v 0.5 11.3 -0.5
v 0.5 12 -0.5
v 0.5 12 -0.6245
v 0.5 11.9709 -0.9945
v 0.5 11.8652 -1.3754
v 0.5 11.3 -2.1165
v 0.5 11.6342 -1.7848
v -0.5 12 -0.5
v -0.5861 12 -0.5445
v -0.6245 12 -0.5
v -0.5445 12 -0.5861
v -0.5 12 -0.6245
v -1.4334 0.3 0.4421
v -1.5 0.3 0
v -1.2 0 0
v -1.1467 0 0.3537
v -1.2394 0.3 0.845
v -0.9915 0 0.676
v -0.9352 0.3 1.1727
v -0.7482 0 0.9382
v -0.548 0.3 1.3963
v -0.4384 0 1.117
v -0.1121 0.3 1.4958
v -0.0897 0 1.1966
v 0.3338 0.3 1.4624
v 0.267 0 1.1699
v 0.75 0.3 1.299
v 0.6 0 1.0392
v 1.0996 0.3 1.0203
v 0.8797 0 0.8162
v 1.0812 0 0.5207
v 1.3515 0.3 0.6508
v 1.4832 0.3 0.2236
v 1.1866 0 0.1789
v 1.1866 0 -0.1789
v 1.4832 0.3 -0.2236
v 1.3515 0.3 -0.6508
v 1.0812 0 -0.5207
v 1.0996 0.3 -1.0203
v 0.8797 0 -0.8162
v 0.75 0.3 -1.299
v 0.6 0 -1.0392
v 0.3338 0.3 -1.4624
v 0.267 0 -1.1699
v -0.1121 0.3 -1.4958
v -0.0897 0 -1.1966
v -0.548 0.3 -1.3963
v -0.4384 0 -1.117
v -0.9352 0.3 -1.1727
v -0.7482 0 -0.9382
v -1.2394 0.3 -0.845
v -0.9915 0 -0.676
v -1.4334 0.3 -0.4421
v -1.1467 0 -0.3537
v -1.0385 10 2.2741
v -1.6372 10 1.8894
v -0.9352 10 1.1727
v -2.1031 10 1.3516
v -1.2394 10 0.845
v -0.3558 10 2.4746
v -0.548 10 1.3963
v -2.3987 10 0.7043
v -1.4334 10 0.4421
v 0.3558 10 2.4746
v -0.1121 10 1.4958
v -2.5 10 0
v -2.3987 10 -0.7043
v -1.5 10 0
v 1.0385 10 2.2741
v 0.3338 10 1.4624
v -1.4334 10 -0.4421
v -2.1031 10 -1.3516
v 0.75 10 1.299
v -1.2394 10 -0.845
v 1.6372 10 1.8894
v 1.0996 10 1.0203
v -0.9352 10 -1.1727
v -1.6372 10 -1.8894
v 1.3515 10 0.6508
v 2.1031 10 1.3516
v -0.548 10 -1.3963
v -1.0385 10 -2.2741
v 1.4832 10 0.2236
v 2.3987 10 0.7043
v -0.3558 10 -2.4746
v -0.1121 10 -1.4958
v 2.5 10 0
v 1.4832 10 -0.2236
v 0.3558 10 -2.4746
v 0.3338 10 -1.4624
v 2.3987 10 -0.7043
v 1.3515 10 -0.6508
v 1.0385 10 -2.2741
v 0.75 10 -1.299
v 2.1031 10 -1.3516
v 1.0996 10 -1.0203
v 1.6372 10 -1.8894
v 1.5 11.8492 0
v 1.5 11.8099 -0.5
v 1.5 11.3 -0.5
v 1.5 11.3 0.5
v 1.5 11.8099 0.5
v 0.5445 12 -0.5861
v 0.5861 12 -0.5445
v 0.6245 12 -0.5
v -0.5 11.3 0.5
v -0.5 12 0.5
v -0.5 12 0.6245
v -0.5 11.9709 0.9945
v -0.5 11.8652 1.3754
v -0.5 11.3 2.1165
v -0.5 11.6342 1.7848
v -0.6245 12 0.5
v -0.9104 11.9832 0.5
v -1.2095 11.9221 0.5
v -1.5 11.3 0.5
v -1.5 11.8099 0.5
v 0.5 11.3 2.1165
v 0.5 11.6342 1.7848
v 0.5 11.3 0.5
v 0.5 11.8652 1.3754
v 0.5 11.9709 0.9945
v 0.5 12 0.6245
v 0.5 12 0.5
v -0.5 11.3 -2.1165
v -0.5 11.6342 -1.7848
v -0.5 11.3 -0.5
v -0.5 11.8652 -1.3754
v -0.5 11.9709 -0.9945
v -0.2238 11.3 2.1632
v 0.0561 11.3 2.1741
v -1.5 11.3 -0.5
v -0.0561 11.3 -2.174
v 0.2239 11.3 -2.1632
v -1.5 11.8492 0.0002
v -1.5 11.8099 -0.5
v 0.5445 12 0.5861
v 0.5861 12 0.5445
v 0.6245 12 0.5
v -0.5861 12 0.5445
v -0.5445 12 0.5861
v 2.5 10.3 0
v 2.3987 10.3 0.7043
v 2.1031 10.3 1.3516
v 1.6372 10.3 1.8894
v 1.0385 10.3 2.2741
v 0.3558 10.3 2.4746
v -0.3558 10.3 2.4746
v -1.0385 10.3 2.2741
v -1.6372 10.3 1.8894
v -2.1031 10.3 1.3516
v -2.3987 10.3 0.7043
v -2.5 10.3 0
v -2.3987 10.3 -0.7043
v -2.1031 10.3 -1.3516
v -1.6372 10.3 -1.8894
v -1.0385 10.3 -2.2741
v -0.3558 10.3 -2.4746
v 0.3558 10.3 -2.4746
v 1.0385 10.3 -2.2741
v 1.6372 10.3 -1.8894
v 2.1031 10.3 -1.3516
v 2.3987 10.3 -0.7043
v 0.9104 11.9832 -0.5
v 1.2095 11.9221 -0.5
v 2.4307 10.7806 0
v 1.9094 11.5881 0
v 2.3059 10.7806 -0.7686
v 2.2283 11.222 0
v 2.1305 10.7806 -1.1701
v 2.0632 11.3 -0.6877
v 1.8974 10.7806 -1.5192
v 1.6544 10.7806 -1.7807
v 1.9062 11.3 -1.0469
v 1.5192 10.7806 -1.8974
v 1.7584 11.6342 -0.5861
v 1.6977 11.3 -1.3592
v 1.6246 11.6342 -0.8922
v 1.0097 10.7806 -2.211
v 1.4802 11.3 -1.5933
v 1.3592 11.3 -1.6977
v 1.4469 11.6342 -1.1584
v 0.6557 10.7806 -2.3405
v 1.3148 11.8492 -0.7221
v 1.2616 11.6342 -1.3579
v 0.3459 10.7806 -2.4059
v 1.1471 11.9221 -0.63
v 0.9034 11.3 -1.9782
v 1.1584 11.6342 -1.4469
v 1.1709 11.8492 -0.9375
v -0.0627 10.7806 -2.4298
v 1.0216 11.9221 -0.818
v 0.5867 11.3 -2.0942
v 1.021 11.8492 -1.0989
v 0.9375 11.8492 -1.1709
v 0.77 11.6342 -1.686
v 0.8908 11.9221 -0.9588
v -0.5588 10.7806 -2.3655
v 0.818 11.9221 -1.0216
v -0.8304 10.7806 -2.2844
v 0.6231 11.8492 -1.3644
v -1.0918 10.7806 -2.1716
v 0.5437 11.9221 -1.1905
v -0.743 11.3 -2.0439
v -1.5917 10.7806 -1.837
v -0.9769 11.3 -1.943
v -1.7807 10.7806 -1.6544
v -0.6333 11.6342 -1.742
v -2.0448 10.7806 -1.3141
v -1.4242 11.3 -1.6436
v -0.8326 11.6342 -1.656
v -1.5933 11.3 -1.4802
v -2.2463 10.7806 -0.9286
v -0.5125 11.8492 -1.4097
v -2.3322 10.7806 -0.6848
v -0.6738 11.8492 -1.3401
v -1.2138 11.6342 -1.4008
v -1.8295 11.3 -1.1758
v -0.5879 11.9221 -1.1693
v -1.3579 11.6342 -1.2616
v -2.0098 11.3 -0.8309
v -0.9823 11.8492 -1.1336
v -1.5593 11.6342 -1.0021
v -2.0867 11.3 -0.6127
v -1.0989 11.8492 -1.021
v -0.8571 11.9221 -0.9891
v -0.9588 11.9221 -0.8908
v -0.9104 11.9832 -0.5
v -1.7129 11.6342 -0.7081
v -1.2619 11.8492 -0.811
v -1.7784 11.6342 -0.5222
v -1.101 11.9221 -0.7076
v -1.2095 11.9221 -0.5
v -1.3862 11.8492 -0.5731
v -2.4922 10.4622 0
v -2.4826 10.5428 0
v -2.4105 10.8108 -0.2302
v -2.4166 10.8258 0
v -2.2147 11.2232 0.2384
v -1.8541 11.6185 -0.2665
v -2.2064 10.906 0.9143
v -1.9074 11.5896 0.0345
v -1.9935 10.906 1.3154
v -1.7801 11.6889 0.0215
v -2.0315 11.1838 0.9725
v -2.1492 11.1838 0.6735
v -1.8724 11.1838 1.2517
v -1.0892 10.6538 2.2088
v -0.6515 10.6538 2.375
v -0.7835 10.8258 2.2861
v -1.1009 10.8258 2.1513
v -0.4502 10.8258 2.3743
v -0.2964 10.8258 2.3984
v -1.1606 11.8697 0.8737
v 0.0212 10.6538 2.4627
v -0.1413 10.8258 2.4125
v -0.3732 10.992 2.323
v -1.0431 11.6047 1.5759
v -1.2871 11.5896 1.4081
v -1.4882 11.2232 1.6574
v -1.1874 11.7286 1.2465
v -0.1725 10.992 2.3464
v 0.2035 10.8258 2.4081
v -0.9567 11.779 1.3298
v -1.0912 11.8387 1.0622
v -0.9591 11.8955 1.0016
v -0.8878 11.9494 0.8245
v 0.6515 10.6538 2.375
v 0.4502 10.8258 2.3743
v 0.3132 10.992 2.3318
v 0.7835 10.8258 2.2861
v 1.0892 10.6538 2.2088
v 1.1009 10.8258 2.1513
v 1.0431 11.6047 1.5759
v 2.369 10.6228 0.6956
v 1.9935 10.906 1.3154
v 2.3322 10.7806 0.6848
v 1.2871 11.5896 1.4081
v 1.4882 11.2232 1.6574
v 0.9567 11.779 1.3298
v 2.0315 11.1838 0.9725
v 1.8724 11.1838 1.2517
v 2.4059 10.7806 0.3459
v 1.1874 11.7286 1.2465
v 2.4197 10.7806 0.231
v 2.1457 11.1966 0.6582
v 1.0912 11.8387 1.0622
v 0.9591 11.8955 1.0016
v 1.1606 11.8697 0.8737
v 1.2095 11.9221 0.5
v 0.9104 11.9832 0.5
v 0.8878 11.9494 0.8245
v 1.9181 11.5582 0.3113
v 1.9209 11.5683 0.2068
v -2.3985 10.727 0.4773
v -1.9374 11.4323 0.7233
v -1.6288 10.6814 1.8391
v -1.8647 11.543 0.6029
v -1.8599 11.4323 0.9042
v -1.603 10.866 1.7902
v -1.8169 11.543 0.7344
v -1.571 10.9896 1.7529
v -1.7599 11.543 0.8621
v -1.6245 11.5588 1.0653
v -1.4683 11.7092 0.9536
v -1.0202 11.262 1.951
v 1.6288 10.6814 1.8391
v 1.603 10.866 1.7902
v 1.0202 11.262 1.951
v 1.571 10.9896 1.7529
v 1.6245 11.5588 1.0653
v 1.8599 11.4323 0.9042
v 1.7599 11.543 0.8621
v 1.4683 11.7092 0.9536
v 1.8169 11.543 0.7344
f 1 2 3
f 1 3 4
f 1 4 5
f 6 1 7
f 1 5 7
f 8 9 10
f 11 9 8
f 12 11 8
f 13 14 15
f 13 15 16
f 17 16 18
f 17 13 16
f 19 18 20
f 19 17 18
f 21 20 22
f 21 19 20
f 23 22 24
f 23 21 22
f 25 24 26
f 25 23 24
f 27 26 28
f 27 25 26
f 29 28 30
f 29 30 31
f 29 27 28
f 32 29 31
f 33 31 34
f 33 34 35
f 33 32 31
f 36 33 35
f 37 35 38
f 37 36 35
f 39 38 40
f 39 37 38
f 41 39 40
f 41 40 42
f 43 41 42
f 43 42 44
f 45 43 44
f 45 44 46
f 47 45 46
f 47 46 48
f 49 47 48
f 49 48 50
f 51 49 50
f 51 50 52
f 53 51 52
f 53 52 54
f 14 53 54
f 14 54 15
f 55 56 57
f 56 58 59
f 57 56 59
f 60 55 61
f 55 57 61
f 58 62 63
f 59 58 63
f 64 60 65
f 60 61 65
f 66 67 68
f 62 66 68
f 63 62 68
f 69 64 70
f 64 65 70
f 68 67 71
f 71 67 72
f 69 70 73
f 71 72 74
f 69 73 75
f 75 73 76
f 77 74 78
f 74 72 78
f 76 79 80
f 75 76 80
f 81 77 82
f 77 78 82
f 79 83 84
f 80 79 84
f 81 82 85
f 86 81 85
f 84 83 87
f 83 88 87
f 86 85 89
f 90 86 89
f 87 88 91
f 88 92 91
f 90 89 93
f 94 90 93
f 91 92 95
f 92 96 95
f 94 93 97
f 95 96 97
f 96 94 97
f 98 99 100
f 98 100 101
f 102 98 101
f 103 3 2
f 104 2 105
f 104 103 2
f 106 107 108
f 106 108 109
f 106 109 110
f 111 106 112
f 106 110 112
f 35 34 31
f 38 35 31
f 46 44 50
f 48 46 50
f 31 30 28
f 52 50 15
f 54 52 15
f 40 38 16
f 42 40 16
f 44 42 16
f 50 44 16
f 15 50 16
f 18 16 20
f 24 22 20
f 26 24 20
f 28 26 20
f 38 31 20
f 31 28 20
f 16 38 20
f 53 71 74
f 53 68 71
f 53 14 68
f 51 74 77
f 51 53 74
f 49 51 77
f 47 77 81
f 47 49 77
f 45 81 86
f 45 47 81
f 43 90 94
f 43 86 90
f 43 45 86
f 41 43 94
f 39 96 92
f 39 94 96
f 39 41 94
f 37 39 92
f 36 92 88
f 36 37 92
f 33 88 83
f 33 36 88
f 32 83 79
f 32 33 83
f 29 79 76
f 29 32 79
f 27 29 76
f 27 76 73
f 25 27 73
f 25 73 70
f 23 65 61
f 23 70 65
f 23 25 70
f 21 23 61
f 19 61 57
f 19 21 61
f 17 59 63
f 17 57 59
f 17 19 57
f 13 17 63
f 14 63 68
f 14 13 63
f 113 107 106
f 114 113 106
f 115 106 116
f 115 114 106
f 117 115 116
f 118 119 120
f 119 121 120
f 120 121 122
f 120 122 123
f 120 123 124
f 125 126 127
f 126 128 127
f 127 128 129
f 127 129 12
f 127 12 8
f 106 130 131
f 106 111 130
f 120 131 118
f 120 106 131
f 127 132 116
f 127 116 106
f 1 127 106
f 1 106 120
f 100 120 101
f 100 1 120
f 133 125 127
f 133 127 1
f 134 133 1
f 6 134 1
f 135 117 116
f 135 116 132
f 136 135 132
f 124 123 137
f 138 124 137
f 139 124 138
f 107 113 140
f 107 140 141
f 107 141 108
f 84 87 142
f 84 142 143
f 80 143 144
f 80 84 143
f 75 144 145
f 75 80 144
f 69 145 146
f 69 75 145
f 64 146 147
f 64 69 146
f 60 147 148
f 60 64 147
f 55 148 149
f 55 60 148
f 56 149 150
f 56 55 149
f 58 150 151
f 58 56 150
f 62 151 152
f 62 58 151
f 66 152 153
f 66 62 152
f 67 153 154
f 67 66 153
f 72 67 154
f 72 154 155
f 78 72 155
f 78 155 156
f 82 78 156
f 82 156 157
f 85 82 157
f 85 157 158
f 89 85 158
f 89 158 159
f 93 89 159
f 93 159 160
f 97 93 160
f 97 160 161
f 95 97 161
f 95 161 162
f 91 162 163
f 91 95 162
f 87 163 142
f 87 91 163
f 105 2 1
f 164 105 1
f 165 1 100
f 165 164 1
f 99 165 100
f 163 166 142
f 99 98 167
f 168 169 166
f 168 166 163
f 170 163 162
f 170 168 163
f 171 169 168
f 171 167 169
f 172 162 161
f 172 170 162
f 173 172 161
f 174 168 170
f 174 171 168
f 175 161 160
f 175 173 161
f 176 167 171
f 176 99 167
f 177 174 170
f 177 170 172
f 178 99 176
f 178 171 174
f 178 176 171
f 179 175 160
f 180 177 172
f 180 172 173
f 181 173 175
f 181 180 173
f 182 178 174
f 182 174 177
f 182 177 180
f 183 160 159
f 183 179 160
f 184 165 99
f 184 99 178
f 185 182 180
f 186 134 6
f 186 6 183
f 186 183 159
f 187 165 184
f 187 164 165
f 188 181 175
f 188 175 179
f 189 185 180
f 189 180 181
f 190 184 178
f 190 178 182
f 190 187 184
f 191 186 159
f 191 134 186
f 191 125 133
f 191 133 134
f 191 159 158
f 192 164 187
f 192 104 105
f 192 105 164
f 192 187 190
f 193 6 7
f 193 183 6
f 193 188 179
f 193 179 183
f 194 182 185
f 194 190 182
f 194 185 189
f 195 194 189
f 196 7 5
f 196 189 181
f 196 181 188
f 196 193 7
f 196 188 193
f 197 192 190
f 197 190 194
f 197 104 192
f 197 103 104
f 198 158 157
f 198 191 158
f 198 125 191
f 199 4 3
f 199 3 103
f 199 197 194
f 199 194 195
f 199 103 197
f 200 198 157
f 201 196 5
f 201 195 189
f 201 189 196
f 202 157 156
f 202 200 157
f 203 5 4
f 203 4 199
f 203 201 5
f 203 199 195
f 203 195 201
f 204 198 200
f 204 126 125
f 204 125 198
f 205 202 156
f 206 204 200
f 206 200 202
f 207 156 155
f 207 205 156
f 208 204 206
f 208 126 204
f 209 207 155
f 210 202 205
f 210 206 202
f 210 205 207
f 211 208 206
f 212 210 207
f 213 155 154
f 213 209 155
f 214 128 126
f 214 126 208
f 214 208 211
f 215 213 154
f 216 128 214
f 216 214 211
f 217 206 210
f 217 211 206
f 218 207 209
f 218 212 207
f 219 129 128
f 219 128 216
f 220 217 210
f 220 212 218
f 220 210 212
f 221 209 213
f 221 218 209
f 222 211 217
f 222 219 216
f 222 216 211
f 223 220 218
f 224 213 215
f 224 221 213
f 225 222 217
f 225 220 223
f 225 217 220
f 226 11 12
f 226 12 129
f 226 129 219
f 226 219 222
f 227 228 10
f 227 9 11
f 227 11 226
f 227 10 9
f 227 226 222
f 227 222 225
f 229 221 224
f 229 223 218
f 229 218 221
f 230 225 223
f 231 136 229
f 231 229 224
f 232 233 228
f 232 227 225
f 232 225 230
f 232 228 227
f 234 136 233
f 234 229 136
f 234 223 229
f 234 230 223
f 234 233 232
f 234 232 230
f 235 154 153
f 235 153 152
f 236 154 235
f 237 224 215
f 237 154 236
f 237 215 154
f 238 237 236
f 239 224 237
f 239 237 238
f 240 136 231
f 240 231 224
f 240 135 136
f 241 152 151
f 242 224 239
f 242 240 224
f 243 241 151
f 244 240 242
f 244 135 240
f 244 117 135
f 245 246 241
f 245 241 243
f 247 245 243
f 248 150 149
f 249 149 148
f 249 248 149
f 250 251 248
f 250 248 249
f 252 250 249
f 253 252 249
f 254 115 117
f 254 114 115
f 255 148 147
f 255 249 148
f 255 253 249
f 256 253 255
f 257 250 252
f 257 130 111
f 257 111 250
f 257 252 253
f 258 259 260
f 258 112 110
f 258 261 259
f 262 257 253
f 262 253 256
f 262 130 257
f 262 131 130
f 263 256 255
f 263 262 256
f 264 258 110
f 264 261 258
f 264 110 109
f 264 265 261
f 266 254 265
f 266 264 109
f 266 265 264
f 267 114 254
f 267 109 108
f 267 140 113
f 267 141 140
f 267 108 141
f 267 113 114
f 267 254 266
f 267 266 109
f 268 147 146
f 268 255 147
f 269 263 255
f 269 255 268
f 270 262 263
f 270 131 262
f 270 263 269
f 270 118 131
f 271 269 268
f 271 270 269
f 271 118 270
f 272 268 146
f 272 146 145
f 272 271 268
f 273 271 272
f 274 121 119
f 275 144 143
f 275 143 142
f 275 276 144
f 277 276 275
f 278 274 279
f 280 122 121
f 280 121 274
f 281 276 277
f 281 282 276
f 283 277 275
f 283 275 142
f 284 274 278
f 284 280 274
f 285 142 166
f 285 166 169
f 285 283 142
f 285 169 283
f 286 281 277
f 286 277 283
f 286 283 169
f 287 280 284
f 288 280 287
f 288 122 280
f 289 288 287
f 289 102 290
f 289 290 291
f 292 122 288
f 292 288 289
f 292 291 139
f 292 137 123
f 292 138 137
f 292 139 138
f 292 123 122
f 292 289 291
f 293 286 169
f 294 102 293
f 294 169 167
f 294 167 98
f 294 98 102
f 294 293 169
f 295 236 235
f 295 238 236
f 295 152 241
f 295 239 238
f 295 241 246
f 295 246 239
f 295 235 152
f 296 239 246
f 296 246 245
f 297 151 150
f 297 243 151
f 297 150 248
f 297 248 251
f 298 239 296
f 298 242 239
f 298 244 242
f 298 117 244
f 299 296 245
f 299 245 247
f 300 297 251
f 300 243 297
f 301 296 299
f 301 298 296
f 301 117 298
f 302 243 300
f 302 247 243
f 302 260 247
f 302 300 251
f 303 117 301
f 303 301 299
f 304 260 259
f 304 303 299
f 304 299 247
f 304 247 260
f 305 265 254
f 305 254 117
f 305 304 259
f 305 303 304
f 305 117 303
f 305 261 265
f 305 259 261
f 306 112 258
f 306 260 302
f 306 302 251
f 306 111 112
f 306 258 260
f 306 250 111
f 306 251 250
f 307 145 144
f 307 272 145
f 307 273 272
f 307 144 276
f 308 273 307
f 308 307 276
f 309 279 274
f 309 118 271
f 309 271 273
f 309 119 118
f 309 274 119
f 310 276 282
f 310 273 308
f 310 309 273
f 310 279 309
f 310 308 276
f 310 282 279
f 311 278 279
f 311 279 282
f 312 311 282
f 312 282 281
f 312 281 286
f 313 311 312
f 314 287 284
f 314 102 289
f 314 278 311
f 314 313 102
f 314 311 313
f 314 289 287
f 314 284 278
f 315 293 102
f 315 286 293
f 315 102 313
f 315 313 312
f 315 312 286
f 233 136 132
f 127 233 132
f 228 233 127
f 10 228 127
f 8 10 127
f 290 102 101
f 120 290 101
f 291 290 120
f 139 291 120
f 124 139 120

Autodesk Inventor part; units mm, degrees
ref_plane "YZ Plane" through (0, 0, 0) normal (1, 0, 0) x (0, 1, 0)
ref_plane "XZ Plane" through (0, 0, 0) normal (0, 1, 0) x (-1, 0, 0)
ref_plane "XY Plane" through (0, 0, 0) normal (0, 0, 1) x (1, 0, 0)
sketch "Sketch1" plane through (0, 0, 0) normal (0, 1, 0) x (-1, 0, 0)
  circle A0 centre (0, 0) radius 1.5
  dimension "d0" = 3
extrude "Extrusion1" add sketch "Sketch1" along normal blind 10
sketch "Sketch2" plane through (0, 10, 0) normal (0, 1, 0) x (1, 0, 0)
  circle A0 centre (0, 0) radius 2.5
  dimension "d3" = 5
extrude "Extrusion2" add sketch "Sketch2" along normal blind 2
fillet "Fillet1" radius 1.7 1 edges at (-2.5, 12, 0)
chamfer "Chamfer1" distance 0.3 angle 45 1 edges at (1.5, 0, 0)
thread "Thread1" size "M3x0.5" class "6g" standard "ANSI Metric M Profile" full length
sketch "Sketch3" plane through (0, 12, 0) normal (0, 1, 0) x (1, 0, 0)
  line L0 (0.5, -2.5) -> (0.5, 2.5)
  line L1 (0.5, 2.5) -> (-0.5, 2.5)
  line L2 (-0.5, 2.5) -> (-0.5, -2.5)
  line L3 (-0.5, -2.5) -> (0.5, -2.5)
  line L4 (0.5, -2.5) -> (-0.5, 2.5) construction
  line L5 (0.5, 2.5) -> (-0.5, -2.5) construction
  line L6 (1.5, -0.5) -> (-1.5, -0.5)
  line L7 (-1.5, -0.5) -> (-1.5, 0.5)
  line L8 (-1.5, 0.5) -> (1.5, 0.5)
  line L9 (1.5, 0.5) -> (1.5, -0.5)
  circle A0 centre (0, 0) radius 2.5 projected
  line L10 (1.5, -0.5) -> (-1.5, 0.5) construction
  line L11 (-1.5, -0.5) -> (1.5, 0.5) construction
  dimension "d12" = 1
  dimension "d13" = 3
  dimension "d14" = 1
extrude "Extrusion3" cut sketch "Sketch3" against normal blind 0.7 contours L3 A0 L0 | A0 L2 L6 L0 | L3 L2 A0 | L6 L2 L8 L0 | L0 L8 L9 L6 | L8 L2 A0 L0 | L6 L7 L8 L2 | A0 L1 L0 | L2 L1 A0
properties part number "M3x10 Screw Nylon" material "Nylon 6"
